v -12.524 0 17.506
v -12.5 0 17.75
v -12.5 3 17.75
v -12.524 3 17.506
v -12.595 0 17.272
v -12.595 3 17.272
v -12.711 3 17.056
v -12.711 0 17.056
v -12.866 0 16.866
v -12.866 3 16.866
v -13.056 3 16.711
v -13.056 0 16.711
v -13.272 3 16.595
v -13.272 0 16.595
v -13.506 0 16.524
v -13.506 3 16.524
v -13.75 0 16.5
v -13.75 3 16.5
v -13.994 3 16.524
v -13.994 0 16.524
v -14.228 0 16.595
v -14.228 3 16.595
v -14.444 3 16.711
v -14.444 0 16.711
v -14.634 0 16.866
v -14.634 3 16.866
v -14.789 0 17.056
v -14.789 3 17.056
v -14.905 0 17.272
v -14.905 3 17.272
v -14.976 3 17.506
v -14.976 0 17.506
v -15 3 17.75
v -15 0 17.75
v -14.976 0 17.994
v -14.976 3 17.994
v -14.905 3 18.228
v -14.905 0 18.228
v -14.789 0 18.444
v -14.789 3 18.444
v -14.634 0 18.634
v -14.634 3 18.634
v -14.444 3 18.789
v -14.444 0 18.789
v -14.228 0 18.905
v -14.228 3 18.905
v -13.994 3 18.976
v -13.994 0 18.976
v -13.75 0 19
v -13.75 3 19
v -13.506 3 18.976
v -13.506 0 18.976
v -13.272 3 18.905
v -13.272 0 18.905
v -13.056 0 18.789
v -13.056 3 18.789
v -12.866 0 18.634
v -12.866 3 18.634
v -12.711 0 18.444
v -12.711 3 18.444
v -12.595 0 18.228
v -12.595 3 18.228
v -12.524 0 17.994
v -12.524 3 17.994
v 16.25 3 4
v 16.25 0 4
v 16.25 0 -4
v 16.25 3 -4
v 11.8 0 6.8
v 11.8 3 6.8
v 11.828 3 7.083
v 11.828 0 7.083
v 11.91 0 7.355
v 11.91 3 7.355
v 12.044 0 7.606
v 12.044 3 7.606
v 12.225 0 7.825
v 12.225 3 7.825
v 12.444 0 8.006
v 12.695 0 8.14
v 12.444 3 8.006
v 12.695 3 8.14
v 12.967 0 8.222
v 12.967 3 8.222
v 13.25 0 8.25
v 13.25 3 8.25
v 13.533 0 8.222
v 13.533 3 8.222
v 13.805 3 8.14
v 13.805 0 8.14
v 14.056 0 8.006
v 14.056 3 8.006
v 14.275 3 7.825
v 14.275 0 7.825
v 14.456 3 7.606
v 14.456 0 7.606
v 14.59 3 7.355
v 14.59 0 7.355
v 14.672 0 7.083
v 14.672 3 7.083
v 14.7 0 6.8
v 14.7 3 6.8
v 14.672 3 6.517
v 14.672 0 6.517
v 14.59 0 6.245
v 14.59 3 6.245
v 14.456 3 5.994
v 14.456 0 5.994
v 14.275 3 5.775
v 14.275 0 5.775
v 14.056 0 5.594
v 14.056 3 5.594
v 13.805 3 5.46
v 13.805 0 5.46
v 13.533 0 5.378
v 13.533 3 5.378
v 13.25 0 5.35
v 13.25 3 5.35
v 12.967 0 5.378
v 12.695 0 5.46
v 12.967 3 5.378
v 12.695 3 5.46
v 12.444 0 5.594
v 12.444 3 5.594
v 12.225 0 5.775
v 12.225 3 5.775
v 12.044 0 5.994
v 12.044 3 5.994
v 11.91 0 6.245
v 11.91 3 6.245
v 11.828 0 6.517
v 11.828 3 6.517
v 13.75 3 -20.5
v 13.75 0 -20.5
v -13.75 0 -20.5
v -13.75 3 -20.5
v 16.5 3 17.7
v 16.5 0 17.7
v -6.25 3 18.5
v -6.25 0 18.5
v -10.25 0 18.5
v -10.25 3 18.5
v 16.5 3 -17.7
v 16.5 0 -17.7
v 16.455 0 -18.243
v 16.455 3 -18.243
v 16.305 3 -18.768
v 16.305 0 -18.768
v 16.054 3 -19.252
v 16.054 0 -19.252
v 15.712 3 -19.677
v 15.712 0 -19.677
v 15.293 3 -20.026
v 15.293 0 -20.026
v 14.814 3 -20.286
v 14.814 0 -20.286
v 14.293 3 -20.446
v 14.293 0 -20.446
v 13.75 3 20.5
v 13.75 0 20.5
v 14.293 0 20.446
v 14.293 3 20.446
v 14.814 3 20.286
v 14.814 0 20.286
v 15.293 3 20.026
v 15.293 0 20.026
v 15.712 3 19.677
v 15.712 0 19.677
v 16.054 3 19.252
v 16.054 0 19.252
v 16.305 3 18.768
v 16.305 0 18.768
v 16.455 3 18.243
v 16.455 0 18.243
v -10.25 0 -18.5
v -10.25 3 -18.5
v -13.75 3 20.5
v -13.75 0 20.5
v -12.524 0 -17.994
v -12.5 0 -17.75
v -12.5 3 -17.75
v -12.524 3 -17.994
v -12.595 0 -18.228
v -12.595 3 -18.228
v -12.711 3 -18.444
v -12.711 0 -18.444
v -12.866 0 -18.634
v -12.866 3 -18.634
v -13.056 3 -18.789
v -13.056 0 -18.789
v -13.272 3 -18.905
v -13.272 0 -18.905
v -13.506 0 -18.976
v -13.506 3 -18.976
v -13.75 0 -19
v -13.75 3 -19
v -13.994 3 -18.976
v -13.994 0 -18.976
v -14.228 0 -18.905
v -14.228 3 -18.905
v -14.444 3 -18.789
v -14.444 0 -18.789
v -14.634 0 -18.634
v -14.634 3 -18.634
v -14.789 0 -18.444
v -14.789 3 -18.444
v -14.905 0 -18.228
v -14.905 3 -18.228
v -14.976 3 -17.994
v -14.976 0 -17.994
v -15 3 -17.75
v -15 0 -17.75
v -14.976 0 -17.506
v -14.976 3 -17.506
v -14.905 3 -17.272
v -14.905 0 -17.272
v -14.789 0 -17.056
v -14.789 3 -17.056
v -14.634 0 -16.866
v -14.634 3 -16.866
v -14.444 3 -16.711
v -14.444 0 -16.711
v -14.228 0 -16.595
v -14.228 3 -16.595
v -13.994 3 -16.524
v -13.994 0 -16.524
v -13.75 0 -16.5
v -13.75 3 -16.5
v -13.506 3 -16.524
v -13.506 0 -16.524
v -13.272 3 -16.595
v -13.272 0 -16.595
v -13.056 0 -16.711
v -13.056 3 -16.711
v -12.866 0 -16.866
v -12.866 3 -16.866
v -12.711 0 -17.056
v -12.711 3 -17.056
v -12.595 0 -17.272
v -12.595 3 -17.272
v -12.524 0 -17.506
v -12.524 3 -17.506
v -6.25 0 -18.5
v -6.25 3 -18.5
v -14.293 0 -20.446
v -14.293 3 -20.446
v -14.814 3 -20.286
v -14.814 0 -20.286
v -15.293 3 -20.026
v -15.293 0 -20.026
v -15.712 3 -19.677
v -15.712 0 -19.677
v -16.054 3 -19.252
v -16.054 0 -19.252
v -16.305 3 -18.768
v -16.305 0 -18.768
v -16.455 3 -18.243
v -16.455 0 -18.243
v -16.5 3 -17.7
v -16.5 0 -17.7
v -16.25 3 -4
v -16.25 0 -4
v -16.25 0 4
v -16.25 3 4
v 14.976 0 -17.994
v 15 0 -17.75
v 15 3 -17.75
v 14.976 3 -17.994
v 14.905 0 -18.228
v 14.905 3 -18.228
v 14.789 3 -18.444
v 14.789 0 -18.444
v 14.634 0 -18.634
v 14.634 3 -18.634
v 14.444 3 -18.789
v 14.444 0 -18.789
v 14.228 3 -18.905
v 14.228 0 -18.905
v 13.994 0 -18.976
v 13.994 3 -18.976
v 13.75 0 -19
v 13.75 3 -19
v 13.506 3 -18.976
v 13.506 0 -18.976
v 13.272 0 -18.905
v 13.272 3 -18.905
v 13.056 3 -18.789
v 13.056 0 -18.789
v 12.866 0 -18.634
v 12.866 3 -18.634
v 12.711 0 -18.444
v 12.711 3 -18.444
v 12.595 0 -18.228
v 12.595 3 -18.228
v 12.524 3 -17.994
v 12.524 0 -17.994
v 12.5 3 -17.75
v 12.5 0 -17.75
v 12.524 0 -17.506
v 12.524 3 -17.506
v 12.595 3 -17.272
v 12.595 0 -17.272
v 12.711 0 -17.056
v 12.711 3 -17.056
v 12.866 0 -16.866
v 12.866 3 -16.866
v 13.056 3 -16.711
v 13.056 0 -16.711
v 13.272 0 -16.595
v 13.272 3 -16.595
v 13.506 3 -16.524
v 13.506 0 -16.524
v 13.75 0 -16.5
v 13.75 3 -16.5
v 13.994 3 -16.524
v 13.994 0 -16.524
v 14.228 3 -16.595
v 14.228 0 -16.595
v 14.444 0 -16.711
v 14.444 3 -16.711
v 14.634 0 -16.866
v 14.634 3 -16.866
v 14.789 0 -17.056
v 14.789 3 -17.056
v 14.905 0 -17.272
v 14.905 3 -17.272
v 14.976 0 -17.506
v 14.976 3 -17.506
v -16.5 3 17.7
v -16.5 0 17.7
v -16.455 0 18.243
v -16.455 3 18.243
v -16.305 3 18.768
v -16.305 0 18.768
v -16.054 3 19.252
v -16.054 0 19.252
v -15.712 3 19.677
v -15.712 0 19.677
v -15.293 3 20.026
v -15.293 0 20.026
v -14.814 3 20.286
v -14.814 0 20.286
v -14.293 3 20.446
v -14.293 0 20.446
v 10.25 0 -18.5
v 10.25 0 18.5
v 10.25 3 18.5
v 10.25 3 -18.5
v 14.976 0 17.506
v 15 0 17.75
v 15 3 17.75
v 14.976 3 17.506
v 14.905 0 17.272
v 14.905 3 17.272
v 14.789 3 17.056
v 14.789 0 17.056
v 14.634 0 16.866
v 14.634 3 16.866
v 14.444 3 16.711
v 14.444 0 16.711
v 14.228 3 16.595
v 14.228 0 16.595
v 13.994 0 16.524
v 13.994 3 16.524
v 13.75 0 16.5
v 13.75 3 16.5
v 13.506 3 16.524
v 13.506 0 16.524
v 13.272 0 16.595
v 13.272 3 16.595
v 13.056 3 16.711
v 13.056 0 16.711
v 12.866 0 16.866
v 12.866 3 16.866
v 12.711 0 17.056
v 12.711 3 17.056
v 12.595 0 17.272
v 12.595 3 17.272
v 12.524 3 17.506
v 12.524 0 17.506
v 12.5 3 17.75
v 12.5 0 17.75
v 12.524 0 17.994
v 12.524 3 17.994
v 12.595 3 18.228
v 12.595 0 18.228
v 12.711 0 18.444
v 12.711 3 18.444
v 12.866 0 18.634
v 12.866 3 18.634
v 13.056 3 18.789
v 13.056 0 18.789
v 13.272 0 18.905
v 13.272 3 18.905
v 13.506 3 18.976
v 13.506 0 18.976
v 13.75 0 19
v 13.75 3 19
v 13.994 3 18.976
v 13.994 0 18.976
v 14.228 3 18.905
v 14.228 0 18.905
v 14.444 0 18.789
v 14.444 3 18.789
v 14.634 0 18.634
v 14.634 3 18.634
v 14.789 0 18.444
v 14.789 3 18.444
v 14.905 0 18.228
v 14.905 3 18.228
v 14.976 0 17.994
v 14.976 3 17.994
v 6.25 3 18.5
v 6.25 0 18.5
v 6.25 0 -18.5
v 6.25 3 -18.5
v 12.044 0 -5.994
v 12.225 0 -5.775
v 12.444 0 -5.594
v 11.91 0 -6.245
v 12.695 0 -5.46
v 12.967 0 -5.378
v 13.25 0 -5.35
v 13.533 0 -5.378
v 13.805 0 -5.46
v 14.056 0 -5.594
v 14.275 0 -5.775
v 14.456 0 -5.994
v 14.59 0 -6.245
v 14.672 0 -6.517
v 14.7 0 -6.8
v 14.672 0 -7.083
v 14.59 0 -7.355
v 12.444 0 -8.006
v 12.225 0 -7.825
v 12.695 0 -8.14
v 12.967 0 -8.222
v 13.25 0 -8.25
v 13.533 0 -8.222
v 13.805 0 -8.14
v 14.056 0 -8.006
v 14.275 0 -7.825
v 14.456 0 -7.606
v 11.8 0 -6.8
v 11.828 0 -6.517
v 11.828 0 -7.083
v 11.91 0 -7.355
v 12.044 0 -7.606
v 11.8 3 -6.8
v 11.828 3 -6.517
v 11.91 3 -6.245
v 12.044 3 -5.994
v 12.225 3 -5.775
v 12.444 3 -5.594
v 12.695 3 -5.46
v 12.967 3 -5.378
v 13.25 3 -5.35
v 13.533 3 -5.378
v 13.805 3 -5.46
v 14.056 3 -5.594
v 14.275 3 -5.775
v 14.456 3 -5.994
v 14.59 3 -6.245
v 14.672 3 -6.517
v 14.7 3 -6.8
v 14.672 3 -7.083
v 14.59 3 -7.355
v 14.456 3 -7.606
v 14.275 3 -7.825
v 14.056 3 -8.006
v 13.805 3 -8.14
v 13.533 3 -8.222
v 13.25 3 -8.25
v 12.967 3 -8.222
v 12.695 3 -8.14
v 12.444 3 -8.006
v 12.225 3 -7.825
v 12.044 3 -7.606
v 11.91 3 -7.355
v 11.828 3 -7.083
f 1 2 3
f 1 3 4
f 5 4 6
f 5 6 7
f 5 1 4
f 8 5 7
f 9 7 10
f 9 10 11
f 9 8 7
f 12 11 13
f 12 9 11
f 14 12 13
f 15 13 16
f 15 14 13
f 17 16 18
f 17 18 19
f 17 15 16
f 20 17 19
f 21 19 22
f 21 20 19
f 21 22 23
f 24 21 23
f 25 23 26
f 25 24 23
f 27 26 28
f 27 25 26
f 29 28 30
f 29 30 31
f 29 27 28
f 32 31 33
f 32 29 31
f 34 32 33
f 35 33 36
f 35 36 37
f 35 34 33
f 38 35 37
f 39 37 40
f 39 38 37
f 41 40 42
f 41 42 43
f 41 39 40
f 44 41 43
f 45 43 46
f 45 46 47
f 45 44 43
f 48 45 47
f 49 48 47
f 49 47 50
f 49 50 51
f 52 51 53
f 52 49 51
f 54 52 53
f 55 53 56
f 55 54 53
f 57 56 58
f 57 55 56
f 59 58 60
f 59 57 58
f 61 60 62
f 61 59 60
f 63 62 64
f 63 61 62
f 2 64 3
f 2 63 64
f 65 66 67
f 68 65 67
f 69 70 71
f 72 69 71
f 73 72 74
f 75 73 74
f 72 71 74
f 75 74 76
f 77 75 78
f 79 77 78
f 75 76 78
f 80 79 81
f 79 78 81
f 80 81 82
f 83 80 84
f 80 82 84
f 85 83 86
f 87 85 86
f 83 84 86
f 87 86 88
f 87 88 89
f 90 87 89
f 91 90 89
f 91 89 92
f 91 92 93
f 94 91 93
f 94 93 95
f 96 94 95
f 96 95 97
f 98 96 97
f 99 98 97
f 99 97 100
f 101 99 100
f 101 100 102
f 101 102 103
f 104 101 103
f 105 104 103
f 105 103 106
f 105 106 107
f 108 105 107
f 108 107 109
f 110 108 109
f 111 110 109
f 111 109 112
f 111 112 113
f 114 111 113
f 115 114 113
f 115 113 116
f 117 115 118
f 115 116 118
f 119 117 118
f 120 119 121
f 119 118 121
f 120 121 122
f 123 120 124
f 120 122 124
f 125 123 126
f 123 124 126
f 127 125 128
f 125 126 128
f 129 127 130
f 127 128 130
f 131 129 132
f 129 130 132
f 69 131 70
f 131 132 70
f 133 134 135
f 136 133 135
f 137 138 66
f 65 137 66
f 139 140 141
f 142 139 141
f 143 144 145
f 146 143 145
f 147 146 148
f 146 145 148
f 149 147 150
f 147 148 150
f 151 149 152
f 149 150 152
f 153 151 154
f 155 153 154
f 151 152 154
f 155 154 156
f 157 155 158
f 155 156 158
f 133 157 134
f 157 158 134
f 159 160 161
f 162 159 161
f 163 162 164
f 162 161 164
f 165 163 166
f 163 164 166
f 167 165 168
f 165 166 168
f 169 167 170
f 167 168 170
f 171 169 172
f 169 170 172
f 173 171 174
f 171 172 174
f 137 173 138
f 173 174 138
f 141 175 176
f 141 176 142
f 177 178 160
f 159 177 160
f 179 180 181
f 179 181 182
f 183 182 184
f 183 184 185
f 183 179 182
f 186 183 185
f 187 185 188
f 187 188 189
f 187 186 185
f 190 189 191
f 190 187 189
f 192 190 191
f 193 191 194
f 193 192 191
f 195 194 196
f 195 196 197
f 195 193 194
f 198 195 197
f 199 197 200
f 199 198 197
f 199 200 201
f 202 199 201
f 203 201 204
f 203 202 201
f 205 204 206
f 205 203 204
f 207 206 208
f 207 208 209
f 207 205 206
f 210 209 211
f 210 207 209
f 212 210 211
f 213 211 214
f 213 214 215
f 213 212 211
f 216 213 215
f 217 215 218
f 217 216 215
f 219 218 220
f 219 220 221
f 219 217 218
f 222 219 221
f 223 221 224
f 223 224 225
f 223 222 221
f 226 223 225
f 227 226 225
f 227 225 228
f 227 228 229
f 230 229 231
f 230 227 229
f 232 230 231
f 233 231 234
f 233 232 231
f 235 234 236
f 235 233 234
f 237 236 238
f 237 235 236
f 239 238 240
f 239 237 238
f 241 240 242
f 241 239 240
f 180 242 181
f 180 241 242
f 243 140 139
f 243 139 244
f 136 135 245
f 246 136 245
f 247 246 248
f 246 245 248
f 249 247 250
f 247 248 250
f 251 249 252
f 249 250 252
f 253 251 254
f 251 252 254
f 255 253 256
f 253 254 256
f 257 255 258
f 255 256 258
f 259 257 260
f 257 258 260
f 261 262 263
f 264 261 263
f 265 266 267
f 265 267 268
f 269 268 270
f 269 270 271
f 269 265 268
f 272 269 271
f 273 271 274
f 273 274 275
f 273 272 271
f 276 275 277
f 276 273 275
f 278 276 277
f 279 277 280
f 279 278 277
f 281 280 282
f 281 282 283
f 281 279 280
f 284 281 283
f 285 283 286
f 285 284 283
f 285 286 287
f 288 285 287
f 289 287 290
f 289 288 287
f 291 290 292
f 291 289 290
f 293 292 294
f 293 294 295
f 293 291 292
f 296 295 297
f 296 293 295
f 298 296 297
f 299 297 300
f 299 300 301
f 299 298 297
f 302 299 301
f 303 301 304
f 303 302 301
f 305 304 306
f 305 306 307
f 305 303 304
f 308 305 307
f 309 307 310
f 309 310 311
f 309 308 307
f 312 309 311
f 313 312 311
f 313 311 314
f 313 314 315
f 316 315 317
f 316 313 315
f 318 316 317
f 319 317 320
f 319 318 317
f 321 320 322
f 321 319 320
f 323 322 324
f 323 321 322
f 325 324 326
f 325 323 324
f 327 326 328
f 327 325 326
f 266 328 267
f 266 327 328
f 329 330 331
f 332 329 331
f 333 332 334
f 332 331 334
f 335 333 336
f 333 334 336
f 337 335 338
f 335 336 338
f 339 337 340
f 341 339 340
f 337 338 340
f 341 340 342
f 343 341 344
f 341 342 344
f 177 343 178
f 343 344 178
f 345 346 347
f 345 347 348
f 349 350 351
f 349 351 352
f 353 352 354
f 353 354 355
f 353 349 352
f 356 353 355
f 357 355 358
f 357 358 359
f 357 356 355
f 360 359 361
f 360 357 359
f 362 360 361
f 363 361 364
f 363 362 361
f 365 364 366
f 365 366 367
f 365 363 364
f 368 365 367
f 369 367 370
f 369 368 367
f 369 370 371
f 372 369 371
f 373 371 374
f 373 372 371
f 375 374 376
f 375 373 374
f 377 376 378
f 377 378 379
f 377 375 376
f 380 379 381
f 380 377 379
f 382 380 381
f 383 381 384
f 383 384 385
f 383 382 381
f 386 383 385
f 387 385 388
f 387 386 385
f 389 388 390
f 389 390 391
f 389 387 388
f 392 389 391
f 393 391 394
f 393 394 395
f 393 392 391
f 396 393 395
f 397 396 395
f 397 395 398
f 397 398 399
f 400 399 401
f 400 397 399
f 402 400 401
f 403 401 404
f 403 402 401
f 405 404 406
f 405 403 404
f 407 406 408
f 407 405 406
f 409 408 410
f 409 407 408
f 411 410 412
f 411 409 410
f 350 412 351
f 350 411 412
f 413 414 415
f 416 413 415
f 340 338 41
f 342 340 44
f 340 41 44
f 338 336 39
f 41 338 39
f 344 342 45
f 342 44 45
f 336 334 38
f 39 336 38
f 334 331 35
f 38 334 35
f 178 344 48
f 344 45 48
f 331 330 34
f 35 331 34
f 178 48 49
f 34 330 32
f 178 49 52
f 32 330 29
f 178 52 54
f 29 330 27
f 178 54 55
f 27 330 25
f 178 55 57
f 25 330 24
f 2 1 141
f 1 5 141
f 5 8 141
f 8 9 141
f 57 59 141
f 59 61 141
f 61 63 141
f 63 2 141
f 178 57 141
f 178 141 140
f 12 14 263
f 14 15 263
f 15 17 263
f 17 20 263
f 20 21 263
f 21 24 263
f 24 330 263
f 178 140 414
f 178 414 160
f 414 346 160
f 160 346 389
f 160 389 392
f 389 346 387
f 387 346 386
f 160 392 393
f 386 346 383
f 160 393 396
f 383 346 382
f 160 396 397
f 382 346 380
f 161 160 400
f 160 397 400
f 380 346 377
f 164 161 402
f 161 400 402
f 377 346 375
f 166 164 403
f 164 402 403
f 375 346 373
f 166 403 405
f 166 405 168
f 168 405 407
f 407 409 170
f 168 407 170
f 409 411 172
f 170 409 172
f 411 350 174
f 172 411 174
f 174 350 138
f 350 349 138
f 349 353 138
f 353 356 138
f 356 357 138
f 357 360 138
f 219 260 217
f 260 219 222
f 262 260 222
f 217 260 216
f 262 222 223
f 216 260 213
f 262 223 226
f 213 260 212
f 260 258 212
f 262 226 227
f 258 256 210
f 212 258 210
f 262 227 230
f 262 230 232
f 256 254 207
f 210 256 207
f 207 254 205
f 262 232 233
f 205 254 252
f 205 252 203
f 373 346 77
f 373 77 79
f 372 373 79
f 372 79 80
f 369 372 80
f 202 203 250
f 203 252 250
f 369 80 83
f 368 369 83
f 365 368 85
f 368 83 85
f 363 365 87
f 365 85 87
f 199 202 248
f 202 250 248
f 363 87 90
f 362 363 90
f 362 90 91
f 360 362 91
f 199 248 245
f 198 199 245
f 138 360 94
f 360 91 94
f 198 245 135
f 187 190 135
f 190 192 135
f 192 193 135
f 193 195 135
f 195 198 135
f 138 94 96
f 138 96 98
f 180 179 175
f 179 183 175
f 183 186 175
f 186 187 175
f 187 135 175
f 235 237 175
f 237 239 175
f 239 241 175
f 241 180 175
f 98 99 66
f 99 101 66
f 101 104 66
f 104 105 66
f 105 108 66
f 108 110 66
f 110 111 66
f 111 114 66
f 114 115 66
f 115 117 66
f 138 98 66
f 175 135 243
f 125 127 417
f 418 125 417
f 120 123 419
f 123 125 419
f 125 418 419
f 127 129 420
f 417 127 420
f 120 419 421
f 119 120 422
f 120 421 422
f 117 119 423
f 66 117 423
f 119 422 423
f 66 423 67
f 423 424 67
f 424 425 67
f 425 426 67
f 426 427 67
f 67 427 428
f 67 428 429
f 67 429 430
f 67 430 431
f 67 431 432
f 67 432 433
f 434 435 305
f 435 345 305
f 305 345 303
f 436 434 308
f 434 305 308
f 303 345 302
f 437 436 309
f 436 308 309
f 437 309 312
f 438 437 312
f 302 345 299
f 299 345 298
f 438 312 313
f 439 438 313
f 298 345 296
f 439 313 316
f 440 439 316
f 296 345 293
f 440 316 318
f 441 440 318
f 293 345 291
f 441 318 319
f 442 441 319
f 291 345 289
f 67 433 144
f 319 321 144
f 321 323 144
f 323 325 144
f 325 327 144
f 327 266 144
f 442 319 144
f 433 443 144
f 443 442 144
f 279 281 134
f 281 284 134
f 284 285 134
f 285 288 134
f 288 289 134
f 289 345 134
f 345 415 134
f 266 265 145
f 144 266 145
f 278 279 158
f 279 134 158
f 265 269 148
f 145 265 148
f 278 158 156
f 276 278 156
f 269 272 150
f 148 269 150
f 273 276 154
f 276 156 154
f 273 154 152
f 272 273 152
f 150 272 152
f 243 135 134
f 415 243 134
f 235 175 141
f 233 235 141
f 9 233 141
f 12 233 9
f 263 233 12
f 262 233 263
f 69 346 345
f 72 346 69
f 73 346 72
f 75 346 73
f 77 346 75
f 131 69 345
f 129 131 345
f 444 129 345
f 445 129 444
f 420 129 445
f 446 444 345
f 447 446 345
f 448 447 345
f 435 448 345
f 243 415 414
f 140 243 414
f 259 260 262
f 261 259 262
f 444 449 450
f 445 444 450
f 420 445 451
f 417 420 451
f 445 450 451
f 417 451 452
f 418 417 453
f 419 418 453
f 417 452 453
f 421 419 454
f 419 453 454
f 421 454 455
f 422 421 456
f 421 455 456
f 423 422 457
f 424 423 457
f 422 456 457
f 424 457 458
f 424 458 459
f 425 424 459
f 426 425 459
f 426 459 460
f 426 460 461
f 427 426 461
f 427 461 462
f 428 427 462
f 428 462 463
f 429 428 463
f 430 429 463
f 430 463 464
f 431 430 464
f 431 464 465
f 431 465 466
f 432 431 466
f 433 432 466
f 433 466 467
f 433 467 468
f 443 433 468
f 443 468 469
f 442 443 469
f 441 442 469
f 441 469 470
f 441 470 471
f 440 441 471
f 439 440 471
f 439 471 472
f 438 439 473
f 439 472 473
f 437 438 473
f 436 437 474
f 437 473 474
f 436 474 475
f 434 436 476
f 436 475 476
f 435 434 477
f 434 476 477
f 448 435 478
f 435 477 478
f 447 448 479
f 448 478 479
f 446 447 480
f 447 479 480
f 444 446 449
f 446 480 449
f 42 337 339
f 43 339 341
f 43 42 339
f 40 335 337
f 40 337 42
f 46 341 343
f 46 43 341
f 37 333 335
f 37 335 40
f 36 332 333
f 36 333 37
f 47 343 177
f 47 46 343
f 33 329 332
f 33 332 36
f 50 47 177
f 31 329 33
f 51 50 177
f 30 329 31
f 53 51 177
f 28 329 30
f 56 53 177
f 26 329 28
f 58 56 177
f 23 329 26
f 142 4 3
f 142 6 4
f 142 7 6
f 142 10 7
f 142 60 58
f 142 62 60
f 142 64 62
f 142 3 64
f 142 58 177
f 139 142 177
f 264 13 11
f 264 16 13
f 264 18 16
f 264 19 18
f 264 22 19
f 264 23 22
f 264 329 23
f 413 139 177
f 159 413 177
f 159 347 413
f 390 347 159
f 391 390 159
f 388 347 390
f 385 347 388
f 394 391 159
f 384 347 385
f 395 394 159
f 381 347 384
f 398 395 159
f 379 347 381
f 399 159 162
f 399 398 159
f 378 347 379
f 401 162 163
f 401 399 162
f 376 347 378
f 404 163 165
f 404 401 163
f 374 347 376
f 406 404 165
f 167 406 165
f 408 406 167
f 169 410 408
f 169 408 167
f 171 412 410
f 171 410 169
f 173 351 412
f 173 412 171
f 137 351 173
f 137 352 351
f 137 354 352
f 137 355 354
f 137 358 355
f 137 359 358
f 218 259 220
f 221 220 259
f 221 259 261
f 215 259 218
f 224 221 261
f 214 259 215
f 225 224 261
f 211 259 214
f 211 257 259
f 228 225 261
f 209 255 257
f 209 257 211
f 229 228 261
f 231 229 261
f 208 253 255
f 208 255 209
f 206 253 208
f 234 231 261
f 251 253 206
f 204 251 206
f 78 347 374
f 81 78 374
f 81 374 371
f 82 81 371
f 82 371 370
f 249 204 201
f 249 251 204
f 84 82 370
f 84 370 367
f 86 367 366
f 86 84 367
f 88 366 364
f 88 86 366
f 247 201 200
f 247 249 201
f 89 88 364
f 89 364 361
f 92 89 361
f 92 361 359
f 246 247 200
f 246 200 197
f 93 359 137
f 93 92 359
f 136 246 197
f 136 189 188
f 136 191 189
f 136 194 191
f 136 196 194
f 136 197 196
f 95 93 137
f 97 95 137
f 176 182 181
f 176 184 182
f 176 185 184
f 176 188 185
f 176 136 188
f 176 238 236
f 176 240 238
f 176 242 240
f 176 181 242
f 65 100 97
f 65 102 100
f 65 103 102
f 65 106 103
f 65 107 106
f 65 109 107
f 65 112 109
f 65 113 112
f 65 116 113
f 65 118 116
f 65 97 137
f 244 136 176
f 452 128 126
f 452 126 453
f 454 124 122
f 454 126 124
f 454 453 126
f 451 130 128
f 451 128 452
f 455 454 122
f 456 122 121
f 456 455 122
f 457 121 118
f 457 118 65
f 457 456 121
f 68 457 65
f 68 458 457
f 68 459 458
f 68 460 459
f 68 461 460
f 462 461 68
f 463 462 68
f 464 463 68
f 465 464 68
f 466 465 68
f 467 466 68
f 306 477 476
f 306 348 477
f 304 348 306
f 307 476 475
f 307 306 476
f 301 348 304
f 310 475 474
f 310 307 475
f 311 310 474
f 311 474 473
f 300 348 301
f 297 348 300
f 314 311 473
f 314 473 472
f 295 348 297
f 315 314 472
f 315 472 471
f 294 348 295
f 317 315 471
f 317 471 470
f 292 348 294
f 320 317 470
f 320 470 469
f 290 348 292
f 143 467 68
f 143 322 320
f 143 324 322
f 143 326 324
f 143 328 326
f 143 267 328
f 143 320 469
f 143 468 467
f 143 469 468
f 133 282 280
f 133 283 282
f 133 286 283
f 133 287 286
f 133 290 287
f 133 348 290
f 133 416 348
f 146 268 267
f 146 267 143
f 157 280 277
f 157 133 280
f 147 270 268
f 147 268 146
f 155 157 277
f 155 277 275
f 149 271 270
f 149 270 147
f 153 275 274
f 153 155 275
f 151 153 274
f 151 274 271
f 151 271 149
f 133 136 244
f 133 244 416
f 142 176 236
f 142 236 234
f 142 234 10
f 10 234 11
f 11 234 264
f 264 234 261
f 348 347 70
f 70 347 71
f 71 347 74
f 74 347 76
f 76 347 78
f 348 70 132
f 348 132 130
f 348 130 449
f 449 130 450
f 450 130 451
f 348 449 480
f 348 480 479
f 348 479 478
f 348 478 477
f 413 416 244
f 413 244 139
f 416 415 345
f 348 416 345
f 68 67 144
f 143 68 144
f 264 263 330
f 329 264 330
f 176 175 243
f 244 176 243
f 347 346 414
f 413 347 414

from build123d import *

# Parameters (mm, degrees)
SKETCH1_R              = 1.25
SKETCH1_W              = 12.5
SKETCH1_H              = 37
BOSS_EXTRUDE1_DEPTH    = 3
M2_5_CLEARANCE_HOLE1_D = 2.9


with BuildPart() as part:
    # Sketch1 → Boss-Extrude1 (new body)
    with BuildSketch(Plane(origin=(0, 0, 0), x_dir=(1, 0, 0), z_dir=(0, 1, 0))):
        with BuildLine():
            Line((-16.25, -4), (-16.499543908, -17.699917074))
            ThreePointArc((-16.499543908, -17.699917074), (-15.712170743, -19.676755298), (-13.75, -20.5))
            Line((-13.75, -20.5), (13.75, -20.5))
            ThreePointArc((13.75, -20.5), (15.712170743, -19.676755298), (16.499543908, -17.699917074))
            Line((16.499543908, -17.699917074), (16.25, -4))
            Line((16.25, -4), (16.25, 0))
            Line((16.25, 0), (16.25, 4))
            Line((16.25, 4), (16.499543908, 17.699917074))
            ThreePointArc((16.499543908, 17.699917074), (15.712170743, 19.676755298), (13.75, 20.5))
            Line((13.75, 20.5), (-13.75, 20.5))
            ThreePointArc((-13.75, 20.5), (-15.712170743, 19.676755298), (-16.499543908, 17.699917074))
            Line((-16.499543908, 17.699917074), (-16.25, 4))
            Line((-16.25, 4), (-16.25, 0))
            Line((-16.25, 0), (-16.25, -4))
        make_face()
        with Locations((-13.75, -17.75)):
            Circle(SKETCH1_R, mode=Mode.SUBTRACT)
        with Locations((-13.75, 17.75)):
            Circle(SKETCH1_R, mode=Mode.SUBTRACT)
        with Locations((13.75, 17.75)):
            Circle(SKETCH1_R, mode=Mode.SUBTRACT)
        with Locations((13.75, -17.75)):
            Circle(SKETCH1_R, mode=Mode.SUBTRACT)
        Polygon((-6.25, 18.5), (-10.25, 18.5), (-10.25, -18.5), (-6.25, -18.5), (6.25, -18.5), (10.25, -18.5), (10.25, 18.5), (6.25, 18.5), align=None, mode=Mode.SUBTRACT)
        Rectangle(SKETCH1_W, SKETCH1_H)
    extrude(amount=BOSS_EXTRUDE1_DEPTH)

    # M2.5 Clearance Hole1 (through all)
    with Locations(Plane.XZ):
        with Locations((13.25, -6.8), (13.25, 6.8)):
            Hole(M2_5_CLEARANCE_HOLE1_D / 2)


solid = part.part
